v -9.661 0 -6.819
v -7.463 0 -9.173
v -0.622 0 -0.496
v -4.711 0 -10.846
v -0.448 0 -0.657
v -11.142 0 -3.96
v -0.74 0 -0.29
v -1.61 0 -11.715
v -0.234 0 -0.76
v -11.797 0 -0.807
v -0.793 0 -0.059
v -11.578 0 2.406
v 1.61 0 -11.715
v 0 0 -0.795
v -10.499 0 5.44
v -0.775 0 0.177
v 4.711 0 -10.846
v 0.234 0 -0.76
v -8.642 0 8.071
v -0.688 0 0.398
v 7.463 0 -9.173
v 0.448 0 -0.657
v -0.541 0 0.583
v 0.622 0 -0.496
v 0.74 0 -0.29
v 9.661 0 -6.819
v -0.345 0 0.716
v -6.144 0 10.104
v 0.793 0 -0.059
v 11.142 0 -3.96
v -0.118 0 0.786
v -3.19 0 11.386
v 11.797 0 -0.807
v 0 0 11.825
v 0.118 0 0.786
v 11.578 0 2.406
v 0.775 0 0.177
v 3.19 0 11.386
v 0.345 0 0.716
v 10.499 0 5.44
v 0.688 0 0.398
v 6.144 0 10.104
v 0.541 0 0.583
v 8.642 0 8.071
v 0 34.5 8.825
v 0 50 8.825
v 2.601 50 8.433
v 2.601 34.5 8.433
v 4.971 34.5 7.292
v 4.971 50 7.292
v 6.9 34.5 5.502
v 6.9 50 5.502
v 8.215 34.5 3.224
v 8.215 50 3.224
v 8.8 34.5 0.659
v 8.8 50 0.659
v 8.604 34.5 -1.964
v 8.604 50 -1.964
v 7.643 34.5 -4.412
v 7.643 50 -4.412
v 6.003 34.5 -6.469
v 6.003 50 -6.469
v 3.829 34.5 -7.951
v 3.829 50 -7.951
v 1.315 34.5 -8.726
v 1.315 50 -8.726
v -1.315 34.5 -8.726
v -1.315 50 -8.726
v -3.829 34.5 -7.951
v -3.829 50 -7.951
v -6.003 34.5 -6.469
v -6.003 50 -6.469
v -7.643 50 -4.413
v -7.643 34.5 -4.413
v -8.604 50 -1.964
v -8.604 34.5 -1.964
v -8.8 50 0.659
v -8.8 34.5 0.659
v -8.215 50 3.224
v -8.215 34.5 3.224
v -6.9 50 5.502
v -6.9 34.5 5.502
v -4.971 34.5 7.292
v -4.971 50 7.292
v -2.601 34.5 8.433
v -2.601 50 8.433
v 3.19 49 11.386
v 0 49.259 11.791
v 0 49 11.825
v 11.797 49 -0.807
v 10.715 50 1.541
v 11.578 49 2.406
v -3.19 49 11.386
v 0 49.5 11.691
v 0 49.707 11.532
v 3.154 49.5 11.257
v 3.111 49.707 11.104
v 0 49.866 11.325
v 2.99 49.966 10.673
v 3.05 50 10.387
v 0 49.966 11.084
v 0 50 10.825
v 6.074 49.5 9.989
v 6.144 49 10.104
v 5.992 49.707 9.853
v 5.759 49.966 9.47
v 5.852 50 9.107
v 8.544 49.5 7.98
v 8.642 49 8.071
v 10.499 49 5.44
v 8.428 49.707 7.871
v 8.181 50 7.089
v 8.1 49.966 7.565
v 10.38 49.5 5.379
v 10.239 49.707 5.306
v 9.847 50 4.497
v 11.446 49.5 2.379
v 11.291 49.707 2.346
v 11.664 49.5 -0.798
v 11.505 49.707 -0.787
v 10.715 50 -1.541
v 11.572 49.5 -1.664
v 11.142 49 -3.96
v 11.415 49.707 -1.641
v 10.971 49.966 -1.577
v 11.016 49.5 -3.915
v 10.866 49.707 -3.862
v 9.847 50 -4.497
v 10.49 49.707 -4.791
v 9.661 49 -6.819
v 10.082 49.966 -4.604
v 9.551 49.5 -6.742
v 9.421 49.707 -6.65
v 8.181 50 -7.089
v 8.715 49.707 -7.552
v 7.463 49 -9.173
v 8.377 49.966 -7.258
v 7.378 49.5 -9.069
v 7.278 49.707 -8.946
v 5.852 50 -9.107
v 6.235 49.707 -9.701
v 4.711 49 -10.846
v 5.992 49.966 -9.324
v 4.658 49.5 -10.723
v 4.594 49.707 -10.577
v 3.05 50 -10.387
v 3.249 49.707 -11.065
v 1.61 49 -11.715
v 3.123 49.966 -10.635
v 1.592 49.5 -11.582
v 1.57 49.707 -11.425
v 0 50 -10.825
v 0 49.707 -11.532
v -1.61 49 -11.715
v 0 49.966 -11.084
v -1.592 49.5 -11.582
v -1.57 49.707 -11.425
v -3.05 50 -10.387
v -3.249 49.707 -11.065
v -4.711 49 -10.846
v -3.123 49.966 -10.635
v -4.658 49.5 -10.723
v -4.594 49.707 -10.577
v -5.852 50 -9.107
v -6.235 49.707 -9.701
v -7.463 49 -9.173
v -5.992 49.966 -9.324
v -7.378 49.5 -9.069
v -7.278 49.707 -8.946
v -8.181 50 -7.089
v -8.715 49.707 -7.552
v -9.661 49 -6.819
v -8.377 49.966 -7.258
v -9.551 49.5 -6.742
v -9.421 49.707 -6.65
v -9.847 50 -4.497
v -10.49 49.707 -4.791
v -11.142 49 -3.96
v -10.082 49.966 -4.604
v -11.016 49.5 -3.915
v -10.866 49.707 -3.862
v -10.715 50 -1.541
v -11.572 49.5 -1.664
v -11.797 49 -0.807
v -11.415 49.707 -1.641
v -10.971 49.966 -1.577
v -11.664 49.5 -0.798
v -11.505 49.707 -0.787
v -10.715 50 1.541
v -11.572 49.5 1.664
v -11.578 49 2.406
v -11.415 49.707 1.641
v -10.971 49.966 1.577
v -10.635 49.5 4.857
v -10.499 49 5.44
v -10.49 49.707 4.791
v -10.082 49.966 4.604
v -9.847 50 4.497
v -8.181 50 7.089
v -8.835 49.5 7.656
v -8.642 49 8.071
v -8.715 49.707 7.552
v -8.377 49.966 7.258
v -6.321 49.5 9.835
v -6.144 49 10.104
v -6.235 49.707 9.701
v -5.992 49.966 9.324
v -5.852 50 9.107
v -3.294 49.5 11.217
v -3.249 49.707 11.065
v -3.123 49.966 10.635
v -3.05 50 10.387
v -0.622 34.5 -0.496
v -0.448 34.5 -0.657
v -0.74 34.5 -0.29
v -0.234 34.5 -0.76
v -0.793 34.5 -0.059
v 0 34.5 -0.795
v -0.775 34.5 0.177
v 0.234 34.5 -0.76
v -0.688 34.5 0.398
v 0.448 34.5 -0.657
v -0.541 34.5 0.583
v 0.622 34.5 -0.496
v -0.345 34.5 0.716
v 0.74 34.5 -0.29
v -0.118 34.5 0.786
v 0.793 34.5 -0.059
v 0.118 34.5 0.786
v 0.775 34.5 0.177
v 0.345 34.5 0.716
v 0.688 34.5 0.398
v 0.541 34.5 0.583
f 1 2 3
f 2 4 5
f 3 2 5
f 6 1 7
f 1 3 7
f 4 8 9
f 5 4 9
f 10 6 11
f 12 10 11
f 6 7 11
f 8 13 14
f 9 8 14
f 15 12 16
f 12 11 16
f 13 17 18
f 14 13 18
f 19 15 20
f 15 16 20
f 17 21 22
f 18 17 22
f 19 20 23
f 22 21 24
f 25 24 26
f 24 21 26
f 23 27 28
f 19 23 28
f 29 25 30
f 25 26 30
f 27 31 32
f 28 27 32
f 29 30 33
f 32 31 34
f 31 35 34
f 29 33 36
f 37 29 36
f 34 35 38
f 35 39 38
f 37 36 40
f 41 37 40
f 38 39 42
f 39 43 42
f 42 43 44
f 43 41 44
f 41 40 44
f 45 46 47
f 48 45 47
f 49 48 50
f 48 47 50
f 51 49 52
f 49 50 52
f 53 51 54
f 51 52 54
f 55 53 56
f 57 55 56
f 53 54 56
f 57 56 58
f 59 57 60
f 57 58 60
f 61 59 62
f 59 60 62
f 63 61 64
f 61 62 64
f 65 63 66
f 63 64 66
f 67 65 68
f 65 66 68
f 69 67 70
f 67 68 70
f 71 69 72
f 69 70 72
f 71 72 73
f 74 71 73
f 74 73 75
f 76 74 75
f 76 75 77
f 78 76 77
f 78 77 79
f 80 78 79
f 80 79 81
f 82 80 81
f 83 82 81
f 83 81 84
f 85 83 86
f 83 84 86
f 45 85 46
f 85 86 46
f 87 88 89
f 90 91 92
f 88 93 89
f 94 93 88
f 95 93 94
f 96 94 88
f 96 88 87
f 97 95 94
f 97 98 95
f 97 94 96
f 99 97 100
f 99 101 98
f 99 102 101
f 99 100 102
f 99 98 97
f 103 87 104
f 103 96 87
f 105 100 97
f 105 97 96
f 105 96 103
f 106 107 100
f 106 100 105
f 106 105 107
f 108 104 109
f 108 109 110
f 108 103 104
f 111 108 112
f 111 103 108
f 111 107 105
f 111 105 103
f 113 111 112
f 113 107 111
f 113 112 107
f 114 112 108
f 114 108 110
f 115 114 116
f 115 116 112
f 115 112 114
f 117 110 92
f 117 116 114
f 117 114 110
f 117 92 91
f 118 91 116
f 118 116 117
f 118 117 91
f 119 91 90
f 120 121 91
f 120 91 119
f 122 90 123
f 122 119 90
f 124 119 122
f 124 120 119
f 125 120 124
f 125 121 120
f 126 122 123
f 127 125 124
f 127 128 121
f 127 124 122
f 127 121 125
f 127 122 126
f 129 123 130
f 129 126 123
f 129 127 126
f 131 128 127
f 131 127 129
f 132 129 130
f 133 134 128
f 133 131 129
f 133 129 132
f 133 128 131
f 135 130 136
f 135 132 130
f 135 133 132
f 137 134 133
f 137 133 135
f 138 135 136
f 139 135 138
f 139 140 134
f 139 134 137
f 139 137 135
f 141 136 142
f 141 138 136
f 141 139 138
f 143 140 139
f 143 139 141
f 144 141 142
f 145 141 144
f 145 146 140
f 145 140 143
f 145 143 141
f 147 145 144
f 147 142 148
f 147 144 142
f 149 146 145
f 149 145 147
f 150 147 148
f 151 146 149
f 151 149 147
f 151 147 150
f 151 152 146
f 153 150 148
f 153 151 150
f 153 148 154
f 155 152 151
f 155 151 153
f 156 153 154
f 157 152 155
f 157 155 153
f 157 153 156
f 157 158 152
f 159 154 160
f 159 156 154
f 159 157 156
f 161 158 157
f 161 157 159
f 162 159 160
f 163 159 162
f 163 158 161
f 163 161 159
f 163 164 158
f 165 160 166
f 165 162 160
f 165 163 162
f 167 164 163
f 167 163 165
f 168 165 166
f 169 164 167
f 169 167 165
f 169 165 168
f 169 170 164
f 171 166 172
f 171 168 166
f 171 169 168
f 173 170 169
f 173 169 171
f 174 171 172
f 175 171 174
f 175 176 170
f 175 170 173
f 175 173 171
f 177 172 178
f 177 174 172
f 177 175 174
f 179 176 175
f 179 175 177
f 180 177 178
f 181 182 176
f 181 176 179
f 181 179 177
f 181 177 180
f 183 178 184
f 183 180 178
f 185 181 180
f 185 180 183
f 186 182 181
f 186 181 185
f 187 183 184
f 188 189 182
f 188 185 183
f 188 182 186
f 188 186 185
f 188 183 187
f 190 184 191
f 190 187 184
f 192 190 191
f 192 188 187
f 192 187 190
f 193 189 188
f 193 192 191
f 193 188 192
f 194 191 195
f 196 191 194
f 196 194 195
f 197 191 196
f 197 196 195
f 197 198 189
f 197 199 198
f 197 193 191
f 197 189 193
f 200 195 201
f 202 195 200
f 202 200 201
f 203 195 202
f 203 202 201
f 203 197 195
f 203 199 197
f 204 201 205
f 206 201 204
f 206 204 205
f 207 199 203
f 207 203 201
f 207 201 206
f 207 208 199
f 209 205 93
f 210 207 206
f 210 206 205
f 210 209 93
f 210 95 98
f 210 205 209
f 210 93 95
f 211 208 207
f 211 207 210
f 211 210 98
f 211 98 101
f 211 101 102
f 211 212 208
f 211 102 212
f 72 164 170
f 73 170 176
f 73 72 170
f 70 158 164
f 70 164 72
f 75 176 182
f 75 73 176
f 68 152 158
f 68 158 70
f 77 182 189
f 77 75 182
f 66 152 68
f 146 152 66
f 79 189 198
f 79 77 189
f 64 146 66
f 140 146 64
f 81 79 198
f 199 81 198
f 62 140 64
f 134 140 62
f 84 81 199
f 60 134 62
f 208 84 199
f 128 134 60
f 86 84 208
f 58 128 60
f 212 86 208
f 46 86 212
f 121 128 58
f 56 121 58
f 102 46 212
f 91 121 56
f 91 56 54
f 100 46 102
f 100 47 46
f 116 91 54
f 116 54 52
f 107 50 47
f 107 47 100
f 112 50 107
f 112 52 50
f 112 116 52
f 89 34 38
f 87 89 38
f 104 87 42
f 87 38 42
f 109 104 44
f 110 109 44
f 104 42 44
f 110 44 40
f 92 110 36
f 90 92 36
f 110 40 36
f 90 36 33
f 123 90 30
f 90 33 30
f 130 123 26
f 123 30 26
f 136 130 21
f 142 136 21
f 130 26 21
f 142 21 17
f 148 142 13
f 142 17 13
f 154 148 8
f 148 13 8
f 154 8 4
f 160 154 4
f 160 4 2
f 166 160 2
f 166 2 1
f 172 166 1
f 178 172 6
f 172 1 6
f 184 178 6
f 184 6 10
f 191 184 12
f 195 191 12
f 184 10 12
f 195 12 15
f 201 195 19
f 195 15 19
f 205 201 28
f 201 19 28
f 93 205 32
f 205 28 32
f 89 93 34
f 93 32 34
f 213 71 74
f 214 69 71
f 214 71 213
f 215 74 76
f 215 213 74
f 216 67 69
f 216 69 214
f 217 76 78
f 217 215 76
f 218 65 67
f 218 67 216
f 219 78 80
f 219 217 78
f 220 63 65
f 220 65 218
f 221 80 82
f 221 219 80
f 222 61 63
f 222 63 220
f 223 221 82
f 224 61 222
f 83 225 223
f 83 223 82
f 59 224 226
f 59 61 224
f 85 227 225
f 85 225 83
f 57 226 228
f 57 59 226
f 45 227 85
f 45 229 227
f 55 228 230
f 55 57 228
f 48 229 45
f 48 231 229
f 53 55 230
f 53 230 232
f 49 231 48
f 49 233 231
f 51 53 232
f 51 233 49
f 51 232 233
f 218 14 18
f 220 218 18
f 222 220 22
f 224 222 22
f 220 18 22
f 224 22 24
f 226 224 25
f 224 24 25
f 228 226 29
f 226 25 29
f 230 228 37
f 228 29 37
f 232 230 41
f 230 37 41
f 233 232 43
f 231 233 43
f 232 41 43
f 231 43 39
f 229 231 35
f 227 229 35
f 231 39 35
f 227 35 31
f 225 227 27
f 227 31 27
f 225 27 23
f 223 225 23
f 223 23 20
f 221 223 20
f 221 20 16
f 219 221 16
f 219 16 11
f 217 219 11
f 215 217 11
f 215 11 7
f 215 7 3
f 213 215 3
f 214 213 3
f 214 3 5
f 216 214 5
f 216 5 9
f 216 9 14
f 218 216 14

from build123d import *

# Parameters (mm, degrees)
SKETCH1_R            = 11.825
MAIN_STRUCTURE_DEPTH = 50
SKETCH2_R            = 8.825
HOLE_DEPTH           = 15.5
STRUCTURE_FILLET_R   = 1
CUT_EXTRUDE1_REACH   = 54.722
SKETCH3_R            = 0.795


with BuildPart() as part:
    # Sketch1 → Main Structure (new body)
    with BuildSketch(Plane(origin=(0, 0, 0), x_dir=(1, 0, 0), z_dir=(0, 1, 0))):
        with Locations(Location((0, 0, 0), (0, 0, 270))):
            Circle(SKETCH1_R)
    extrude(amount=MAIN_STRUCTURE_DEPTH)

    # Sketch2 → Hole (cut)
    with BuildSketch(Plane(origin=(0, 50, 0), x_dir=(1, 0, 0), z_dir=(0, 1, 0))):
        with Locations(Location((0, 0, 0), (0, 0, 270))):
            Circle(SKETCH2_R)
    extrude(amount=-HOLE_DEPTH, mode=Mode.SUBTRACT)

    # Structure Fillet
    structure_fillet_edges = [part.edges().sort_by_distance(p)[0] for p in [
        (0, 50, -11.825),
    ]]
    fillet(structure_fillet_edges, radius=STRUCTURE_FILLET_R)

    # Sketch3 → Cut-Extrude1 (cut, up to next)
    with BuildSketch(Plane.XZ, mode=Mode.PRIVATE) as cut_extrude1_sk1:
        with Locations(Location((0, 0, 0), (0, 0, 270))):
            Circle(SKETCH3_R)
    cut_extrude1_tool1 = extrude(cut_extrude1_sk1.sketch, amount=-CUT_EXTRUDE1_REACH, mode=Mode.PRIVATE) & part.part
    add(cut_extrude1_tool1.solids().sort_by_distance((0, 0, 0))[0], mode=Mode.SUBTRACT)


solid = part.part
